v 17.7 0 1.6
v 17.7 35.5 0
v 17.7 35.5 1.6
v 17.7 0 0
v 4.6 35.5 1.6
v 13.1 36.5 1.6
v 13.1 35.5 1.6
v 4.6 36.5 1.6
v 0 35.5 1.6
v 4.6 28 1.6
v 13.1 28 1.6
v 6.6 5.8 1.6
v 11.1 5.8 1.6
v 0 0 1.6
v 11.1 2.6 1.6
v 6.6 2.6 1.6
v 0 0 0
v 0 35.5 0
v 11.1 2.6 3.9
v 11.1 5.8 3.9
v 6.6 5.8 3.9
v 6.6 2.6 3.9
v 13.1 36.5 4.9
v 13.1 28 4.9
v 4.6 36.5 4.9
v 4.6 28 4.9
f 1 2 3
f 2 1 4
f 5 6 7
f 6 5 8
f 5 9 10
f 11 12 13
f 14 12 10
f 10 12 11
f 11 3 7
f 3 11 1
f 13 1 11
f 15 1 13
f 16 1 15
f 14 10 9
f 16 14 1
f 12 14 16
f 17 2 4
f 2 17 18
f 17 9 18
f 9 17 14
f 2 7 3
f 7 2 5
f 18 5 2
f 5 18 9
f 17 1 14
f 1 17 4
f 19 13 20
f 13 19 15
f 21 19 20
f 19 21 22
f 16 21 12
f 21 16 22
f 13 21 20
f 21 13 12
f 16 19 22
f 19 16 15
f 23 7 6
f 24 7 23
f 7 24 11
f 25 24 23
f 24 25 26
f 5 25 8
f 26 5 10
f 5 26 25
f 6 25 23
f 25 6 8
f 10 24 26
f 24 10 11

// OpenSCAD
module teensy(){

	/* PCB */
	width=17.7;
	len=35.5;
	thick=1.6;
	color("green") cube([width,len,thick],false);

	/* Button */
	butWidth=4.5; butLen=3.2; butHeight=2.3;
	color("white")
		translate([(width-butWidth)/2.0, 2.6, thick])
		cube([butWidth, butLen, butHeight], false);

	/* USB */
	uwidth=8.5;
	uheight=3.3;
	ulen=8.5;
	color("grey")
		translate([(width-uwidth)/2.0, len-ulen+1, thick])
		cube([uwidth, ulen, uheight], false);
}

teensy();
